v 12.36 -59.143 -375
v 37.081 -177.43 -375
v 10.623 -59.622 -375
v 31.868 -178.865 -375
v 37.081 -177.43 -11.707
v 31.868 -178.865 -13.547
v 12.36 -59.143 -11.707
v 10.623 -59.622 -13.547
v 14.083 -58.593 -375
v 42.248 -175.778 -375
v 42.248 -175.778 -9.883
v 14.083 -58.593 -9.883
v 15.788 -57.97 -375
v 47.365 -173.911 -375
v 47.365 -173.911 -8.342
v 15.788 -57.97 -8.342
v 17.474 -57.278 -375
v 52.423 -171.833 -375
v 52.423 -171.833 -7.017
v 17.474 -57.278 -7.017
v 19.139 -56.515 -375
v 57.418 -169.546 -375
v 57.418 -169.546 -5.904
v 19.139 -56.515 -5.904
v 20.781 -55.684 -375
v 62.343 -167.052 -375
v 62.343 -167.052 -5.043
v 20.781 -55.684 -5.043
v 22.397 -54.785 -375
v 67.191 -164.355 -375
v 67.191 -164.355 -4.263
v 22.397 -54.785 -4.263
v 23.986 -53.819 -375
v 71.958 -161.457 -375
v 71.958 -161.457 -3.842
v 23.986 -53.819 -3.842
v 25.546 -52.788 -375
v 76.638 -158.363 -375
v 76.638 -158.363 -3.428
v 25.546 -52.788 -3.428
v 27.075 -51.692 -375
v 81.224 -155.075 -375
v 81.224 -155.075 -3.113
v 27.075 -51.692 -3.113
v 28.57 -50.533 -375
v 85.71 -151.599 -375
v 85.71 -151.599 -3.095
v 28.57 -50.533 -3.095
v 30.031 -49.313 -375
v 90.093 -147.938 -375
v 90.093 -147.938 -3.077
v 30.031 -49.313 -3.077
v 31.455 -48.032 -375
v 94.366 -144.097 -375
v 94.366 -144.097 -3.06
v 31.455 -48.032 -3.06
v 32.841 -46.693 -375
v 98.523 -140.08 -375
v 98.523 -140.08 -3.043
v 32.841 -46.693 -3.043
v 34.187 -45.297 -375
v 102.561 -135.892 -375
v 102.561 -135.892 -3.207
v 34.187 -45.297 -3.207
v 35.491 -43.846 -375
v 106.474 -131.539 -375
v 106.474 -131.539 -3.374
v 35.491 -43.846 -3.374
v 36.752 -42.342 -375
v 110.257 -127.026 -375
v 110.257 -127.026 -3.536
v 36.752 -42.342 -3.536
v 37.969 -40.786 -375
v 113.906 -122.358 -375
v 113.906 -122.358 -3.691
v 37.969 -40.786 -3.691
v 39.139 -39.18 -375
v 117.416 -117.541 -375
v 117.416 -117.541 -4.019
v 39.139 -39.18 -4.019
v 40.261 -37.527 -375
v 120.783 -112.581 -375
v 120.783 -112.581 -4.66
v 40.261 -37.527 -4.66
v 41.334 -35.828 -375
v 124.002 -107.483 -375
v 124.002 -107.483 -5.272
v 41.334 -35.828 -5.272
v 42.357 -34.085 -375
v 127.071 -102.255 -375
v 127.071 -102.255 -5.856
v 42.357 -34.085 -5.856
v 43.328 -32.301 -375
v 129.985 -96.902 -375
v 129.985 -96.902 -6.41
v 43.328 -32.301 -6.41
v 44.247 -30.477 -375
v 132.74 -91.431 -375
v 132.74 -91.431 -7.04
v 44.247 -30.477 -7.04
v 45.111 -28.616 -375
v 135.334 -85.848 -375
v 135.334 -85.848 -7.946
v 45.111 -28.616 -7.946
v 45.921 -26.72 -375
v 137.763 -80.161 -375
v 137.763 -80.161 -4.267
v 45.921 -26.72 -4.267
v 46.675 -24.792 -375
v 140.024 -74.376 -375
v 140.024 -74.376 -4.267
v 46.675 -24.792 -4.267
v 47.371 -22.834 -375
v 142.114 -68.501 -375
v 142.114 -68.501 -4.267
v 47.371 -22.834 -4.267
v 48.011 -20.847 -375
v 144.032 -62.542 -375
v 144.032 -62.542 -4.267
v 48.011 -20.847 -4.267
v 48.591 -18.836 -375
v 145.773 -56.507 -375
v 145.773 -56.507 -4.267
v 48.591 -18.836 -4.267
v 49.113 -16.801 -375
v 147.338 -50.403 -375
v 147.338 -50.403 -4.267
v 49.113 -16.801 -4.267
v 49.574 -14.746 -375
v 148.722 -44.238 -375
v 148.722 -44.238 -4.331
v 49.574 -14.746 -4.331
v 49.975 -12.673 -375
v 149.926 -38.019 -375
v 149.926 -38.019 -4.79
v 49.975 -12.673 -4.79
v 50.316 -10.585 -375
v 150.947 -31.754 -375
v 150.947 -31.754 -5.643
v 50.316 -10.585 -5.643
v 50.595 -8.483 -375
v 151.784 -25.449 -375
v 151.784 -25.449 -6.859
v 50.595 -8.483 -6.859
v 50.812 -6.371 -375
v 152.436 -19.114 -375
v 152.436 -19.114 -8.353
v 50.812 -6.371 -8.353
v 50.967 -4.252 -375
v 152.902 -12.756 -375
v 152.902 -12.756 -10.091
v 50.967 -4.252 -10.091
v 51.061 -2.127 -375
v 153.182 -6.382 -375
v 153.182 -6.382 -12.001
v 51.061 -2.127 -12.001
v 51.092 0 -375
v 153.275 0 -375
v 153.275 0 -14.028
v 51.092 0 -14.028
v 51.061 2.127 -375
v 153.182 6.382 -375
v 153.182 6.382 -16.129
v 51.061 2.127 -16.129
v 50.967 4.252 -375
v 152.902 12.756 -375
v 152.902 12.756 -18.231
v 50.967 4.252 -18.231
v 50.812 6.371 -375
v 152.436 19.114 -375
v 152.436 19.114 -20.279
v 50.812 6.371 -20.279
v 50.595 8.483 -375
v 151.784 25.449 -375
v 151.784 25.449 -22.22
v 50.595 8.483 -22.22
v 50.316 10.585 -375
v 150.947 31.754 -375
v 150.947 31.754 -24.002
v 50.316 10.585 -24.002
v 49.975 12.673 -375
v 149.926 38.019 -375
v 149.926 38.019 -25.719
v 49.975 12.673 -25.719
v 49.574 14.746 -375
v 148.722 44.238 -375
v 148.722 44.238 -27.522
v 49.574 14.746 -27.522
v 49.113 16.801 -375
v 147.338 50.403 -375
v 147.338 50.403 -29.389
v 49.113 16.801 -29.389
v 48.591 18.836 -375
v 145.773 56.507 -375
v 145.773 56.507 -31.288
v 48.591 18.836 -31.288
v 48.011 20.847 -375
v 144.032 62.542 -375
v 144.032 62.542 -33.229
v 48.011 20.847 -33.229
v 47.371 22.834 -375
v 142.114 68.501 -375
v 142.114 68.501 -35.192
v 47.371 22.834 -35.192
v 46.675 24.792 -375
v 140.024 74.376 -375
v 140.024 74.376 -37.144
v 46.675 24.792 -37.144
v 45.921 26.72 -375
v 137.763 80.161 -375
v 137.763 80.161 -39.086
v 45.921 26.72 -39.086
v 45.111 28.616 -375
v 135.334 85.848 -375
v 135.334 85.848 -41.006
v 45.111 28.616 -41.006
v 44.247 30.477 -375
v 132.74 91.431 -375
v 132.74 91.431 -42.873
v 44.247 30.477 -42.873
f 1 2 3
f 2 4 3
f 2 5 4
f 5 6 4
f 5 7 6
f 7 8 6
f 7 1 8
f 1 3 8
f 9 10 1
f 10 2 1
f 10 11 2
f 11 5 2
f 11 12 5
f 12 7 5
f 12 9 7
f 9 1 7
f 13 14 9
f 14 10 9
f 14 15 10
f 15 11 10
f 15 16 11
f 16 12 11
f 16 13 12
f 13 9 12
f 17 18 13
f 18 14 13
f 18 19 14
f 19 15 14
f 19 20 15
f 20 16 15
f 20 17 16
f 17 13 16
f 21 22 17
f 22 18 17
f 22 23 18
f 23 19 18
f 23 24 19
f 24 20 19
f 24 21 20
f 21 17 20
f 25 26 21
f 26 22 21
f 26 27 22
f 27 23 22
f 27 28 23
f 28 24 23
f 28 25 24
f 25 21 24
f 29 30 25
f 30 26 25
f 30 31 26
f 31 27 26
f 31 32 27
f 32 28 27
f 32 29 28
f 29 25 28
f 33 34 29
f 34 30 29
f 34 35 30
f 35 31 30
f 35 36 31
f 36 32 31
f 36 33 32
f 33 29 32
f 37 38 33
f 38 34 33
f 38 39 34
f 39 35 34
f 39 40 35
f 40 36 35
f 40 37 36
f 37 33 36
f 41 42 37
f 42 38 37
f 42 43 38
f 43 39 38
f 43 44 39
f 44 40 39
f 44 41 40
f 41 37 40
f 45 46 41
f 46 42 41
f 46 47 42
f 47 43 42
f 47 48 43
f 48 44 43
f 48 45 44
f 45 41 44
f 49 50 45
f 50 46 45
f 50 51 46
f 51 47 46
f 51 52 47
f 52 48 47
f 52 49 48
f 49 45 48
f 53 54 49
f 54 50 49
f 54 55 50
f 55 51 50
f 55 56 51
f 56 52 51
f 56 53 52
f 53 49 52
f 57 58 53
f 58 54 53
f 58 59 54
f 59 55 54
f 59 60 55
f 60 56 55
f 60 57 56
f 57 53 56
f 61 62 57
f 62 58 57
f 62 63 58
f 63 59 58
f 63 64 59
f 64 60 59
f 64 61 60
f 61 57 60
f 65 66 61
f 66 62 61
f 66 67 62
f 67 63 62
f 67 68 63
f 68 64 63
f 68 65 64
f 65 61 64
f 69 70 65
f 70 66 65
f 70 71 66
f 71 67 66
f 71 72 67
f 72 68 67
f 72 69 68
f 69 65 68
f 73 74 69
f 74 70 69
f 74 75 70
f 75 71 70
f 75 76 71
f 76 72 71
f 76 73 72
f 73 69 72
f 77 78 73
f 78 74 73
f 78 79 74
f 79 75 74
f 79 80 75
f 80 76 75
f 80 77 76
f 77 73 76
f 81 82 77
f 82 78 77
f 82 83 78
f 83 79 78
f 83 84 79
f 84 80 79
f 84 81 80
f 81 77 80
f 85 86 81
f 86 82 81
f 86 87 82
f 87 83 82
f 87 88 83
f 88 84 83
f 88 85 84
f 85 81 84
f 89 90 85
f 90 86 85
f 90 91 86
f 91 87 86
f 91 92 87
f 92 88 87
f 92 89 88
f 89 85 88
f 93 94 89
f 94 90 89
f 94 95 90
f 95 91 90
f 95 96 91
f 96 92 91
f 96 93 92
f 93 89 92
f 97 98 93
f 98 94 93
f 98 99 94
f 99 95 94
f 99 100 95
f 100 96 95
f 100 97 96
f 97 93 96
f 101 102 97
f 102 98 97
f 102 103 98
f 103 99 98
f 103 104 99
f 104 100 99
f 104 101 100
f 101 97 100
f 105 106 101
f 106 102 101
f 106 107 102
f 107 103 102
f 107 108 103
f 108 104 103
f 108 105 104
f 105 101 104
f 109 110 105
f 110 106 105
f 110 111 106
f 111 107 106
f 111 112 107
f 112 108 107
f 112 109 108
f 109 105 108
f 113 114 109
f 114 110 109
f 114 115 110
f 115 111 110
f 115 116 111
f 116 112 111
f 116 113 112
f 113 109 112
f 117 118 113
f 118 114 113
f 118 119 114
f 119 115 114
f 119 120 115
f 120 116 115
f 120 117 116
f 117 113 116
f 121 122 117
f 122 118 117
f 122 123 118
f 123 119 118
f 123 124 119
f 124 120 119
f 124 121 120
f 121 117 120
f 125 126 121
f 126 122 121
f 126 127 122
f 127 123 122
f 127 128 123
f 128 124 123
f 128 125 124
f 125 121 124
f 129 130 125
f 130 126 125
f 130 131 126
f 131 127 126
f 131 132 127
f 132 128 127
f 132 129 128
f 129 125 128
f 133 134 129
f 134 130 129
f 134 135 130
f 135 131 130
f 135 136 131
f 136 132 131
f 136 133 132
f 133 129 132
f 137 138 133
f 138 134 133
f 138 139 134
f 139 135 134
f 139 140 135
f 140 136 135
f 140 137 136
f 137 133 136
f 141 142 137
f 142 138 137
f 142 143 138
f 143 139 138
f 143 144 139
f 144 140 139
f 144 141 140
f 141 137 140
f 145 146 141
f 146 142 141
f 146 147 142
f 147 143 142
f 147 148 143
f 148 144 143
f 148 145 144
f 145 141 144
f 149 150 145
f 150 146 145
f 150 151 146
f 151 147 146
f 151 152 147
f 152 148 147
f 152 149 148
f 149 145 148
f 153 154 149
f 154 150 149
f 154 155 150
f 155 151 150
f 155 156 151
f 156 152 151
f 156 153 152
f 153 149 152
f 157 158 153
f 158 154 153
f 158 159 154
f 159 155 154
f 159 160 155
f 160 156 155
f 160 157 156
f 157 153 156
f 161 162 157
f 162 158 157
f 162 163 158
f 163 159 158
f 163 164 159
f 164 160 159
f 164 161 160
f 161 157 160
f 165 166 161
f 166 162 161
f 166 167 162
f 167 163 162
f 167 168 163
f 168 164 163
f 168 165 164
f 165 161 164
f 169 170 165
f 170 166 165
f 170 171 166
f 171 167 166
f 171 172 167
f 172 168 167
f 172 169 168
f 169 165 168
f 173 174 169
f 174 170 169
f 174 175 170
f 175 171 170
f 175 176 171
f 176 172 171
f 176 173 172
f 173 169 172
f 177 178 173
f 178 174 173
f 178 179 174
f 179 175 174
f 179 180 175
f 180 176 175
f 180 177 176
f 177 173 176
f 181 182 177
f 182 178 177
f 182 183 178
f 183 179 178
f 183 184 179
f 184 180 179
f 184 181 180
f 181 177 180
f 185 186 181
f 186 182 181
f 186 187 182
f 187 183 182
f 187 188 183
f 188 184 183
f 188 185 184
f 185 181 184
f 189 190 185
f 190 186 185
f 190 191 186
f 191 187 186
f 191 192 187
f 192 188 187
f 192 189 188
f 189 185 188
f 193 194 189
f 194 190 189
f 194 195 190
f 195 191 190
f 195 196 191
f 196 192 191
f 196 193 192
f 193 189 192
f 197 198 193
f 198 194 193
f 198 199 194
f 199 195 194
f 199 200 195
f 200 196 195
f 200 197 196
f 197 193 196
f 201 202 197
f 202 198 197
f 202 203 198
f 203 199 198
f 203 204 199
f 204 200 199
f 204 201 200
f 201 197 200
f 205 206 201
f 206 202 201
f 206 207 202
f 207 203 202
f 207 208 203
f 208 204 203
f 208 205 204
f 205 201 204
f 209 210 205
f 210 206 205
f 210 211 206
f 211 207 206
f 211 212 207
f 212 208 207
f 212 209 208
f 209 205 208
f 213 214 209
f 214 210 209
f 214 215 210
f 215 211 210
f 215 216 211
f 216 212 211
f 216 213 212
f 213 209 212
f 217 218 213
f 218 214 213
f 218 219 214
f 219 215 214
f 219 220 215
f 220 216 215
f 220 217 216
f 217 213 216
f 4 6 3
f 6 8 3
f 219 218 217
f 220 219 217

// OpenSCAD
include <winged_helmet_v13.scad>
part = "none"; build = "full";
zone(GUARD_TH_FRONT, GUARD_TH_BACK);
